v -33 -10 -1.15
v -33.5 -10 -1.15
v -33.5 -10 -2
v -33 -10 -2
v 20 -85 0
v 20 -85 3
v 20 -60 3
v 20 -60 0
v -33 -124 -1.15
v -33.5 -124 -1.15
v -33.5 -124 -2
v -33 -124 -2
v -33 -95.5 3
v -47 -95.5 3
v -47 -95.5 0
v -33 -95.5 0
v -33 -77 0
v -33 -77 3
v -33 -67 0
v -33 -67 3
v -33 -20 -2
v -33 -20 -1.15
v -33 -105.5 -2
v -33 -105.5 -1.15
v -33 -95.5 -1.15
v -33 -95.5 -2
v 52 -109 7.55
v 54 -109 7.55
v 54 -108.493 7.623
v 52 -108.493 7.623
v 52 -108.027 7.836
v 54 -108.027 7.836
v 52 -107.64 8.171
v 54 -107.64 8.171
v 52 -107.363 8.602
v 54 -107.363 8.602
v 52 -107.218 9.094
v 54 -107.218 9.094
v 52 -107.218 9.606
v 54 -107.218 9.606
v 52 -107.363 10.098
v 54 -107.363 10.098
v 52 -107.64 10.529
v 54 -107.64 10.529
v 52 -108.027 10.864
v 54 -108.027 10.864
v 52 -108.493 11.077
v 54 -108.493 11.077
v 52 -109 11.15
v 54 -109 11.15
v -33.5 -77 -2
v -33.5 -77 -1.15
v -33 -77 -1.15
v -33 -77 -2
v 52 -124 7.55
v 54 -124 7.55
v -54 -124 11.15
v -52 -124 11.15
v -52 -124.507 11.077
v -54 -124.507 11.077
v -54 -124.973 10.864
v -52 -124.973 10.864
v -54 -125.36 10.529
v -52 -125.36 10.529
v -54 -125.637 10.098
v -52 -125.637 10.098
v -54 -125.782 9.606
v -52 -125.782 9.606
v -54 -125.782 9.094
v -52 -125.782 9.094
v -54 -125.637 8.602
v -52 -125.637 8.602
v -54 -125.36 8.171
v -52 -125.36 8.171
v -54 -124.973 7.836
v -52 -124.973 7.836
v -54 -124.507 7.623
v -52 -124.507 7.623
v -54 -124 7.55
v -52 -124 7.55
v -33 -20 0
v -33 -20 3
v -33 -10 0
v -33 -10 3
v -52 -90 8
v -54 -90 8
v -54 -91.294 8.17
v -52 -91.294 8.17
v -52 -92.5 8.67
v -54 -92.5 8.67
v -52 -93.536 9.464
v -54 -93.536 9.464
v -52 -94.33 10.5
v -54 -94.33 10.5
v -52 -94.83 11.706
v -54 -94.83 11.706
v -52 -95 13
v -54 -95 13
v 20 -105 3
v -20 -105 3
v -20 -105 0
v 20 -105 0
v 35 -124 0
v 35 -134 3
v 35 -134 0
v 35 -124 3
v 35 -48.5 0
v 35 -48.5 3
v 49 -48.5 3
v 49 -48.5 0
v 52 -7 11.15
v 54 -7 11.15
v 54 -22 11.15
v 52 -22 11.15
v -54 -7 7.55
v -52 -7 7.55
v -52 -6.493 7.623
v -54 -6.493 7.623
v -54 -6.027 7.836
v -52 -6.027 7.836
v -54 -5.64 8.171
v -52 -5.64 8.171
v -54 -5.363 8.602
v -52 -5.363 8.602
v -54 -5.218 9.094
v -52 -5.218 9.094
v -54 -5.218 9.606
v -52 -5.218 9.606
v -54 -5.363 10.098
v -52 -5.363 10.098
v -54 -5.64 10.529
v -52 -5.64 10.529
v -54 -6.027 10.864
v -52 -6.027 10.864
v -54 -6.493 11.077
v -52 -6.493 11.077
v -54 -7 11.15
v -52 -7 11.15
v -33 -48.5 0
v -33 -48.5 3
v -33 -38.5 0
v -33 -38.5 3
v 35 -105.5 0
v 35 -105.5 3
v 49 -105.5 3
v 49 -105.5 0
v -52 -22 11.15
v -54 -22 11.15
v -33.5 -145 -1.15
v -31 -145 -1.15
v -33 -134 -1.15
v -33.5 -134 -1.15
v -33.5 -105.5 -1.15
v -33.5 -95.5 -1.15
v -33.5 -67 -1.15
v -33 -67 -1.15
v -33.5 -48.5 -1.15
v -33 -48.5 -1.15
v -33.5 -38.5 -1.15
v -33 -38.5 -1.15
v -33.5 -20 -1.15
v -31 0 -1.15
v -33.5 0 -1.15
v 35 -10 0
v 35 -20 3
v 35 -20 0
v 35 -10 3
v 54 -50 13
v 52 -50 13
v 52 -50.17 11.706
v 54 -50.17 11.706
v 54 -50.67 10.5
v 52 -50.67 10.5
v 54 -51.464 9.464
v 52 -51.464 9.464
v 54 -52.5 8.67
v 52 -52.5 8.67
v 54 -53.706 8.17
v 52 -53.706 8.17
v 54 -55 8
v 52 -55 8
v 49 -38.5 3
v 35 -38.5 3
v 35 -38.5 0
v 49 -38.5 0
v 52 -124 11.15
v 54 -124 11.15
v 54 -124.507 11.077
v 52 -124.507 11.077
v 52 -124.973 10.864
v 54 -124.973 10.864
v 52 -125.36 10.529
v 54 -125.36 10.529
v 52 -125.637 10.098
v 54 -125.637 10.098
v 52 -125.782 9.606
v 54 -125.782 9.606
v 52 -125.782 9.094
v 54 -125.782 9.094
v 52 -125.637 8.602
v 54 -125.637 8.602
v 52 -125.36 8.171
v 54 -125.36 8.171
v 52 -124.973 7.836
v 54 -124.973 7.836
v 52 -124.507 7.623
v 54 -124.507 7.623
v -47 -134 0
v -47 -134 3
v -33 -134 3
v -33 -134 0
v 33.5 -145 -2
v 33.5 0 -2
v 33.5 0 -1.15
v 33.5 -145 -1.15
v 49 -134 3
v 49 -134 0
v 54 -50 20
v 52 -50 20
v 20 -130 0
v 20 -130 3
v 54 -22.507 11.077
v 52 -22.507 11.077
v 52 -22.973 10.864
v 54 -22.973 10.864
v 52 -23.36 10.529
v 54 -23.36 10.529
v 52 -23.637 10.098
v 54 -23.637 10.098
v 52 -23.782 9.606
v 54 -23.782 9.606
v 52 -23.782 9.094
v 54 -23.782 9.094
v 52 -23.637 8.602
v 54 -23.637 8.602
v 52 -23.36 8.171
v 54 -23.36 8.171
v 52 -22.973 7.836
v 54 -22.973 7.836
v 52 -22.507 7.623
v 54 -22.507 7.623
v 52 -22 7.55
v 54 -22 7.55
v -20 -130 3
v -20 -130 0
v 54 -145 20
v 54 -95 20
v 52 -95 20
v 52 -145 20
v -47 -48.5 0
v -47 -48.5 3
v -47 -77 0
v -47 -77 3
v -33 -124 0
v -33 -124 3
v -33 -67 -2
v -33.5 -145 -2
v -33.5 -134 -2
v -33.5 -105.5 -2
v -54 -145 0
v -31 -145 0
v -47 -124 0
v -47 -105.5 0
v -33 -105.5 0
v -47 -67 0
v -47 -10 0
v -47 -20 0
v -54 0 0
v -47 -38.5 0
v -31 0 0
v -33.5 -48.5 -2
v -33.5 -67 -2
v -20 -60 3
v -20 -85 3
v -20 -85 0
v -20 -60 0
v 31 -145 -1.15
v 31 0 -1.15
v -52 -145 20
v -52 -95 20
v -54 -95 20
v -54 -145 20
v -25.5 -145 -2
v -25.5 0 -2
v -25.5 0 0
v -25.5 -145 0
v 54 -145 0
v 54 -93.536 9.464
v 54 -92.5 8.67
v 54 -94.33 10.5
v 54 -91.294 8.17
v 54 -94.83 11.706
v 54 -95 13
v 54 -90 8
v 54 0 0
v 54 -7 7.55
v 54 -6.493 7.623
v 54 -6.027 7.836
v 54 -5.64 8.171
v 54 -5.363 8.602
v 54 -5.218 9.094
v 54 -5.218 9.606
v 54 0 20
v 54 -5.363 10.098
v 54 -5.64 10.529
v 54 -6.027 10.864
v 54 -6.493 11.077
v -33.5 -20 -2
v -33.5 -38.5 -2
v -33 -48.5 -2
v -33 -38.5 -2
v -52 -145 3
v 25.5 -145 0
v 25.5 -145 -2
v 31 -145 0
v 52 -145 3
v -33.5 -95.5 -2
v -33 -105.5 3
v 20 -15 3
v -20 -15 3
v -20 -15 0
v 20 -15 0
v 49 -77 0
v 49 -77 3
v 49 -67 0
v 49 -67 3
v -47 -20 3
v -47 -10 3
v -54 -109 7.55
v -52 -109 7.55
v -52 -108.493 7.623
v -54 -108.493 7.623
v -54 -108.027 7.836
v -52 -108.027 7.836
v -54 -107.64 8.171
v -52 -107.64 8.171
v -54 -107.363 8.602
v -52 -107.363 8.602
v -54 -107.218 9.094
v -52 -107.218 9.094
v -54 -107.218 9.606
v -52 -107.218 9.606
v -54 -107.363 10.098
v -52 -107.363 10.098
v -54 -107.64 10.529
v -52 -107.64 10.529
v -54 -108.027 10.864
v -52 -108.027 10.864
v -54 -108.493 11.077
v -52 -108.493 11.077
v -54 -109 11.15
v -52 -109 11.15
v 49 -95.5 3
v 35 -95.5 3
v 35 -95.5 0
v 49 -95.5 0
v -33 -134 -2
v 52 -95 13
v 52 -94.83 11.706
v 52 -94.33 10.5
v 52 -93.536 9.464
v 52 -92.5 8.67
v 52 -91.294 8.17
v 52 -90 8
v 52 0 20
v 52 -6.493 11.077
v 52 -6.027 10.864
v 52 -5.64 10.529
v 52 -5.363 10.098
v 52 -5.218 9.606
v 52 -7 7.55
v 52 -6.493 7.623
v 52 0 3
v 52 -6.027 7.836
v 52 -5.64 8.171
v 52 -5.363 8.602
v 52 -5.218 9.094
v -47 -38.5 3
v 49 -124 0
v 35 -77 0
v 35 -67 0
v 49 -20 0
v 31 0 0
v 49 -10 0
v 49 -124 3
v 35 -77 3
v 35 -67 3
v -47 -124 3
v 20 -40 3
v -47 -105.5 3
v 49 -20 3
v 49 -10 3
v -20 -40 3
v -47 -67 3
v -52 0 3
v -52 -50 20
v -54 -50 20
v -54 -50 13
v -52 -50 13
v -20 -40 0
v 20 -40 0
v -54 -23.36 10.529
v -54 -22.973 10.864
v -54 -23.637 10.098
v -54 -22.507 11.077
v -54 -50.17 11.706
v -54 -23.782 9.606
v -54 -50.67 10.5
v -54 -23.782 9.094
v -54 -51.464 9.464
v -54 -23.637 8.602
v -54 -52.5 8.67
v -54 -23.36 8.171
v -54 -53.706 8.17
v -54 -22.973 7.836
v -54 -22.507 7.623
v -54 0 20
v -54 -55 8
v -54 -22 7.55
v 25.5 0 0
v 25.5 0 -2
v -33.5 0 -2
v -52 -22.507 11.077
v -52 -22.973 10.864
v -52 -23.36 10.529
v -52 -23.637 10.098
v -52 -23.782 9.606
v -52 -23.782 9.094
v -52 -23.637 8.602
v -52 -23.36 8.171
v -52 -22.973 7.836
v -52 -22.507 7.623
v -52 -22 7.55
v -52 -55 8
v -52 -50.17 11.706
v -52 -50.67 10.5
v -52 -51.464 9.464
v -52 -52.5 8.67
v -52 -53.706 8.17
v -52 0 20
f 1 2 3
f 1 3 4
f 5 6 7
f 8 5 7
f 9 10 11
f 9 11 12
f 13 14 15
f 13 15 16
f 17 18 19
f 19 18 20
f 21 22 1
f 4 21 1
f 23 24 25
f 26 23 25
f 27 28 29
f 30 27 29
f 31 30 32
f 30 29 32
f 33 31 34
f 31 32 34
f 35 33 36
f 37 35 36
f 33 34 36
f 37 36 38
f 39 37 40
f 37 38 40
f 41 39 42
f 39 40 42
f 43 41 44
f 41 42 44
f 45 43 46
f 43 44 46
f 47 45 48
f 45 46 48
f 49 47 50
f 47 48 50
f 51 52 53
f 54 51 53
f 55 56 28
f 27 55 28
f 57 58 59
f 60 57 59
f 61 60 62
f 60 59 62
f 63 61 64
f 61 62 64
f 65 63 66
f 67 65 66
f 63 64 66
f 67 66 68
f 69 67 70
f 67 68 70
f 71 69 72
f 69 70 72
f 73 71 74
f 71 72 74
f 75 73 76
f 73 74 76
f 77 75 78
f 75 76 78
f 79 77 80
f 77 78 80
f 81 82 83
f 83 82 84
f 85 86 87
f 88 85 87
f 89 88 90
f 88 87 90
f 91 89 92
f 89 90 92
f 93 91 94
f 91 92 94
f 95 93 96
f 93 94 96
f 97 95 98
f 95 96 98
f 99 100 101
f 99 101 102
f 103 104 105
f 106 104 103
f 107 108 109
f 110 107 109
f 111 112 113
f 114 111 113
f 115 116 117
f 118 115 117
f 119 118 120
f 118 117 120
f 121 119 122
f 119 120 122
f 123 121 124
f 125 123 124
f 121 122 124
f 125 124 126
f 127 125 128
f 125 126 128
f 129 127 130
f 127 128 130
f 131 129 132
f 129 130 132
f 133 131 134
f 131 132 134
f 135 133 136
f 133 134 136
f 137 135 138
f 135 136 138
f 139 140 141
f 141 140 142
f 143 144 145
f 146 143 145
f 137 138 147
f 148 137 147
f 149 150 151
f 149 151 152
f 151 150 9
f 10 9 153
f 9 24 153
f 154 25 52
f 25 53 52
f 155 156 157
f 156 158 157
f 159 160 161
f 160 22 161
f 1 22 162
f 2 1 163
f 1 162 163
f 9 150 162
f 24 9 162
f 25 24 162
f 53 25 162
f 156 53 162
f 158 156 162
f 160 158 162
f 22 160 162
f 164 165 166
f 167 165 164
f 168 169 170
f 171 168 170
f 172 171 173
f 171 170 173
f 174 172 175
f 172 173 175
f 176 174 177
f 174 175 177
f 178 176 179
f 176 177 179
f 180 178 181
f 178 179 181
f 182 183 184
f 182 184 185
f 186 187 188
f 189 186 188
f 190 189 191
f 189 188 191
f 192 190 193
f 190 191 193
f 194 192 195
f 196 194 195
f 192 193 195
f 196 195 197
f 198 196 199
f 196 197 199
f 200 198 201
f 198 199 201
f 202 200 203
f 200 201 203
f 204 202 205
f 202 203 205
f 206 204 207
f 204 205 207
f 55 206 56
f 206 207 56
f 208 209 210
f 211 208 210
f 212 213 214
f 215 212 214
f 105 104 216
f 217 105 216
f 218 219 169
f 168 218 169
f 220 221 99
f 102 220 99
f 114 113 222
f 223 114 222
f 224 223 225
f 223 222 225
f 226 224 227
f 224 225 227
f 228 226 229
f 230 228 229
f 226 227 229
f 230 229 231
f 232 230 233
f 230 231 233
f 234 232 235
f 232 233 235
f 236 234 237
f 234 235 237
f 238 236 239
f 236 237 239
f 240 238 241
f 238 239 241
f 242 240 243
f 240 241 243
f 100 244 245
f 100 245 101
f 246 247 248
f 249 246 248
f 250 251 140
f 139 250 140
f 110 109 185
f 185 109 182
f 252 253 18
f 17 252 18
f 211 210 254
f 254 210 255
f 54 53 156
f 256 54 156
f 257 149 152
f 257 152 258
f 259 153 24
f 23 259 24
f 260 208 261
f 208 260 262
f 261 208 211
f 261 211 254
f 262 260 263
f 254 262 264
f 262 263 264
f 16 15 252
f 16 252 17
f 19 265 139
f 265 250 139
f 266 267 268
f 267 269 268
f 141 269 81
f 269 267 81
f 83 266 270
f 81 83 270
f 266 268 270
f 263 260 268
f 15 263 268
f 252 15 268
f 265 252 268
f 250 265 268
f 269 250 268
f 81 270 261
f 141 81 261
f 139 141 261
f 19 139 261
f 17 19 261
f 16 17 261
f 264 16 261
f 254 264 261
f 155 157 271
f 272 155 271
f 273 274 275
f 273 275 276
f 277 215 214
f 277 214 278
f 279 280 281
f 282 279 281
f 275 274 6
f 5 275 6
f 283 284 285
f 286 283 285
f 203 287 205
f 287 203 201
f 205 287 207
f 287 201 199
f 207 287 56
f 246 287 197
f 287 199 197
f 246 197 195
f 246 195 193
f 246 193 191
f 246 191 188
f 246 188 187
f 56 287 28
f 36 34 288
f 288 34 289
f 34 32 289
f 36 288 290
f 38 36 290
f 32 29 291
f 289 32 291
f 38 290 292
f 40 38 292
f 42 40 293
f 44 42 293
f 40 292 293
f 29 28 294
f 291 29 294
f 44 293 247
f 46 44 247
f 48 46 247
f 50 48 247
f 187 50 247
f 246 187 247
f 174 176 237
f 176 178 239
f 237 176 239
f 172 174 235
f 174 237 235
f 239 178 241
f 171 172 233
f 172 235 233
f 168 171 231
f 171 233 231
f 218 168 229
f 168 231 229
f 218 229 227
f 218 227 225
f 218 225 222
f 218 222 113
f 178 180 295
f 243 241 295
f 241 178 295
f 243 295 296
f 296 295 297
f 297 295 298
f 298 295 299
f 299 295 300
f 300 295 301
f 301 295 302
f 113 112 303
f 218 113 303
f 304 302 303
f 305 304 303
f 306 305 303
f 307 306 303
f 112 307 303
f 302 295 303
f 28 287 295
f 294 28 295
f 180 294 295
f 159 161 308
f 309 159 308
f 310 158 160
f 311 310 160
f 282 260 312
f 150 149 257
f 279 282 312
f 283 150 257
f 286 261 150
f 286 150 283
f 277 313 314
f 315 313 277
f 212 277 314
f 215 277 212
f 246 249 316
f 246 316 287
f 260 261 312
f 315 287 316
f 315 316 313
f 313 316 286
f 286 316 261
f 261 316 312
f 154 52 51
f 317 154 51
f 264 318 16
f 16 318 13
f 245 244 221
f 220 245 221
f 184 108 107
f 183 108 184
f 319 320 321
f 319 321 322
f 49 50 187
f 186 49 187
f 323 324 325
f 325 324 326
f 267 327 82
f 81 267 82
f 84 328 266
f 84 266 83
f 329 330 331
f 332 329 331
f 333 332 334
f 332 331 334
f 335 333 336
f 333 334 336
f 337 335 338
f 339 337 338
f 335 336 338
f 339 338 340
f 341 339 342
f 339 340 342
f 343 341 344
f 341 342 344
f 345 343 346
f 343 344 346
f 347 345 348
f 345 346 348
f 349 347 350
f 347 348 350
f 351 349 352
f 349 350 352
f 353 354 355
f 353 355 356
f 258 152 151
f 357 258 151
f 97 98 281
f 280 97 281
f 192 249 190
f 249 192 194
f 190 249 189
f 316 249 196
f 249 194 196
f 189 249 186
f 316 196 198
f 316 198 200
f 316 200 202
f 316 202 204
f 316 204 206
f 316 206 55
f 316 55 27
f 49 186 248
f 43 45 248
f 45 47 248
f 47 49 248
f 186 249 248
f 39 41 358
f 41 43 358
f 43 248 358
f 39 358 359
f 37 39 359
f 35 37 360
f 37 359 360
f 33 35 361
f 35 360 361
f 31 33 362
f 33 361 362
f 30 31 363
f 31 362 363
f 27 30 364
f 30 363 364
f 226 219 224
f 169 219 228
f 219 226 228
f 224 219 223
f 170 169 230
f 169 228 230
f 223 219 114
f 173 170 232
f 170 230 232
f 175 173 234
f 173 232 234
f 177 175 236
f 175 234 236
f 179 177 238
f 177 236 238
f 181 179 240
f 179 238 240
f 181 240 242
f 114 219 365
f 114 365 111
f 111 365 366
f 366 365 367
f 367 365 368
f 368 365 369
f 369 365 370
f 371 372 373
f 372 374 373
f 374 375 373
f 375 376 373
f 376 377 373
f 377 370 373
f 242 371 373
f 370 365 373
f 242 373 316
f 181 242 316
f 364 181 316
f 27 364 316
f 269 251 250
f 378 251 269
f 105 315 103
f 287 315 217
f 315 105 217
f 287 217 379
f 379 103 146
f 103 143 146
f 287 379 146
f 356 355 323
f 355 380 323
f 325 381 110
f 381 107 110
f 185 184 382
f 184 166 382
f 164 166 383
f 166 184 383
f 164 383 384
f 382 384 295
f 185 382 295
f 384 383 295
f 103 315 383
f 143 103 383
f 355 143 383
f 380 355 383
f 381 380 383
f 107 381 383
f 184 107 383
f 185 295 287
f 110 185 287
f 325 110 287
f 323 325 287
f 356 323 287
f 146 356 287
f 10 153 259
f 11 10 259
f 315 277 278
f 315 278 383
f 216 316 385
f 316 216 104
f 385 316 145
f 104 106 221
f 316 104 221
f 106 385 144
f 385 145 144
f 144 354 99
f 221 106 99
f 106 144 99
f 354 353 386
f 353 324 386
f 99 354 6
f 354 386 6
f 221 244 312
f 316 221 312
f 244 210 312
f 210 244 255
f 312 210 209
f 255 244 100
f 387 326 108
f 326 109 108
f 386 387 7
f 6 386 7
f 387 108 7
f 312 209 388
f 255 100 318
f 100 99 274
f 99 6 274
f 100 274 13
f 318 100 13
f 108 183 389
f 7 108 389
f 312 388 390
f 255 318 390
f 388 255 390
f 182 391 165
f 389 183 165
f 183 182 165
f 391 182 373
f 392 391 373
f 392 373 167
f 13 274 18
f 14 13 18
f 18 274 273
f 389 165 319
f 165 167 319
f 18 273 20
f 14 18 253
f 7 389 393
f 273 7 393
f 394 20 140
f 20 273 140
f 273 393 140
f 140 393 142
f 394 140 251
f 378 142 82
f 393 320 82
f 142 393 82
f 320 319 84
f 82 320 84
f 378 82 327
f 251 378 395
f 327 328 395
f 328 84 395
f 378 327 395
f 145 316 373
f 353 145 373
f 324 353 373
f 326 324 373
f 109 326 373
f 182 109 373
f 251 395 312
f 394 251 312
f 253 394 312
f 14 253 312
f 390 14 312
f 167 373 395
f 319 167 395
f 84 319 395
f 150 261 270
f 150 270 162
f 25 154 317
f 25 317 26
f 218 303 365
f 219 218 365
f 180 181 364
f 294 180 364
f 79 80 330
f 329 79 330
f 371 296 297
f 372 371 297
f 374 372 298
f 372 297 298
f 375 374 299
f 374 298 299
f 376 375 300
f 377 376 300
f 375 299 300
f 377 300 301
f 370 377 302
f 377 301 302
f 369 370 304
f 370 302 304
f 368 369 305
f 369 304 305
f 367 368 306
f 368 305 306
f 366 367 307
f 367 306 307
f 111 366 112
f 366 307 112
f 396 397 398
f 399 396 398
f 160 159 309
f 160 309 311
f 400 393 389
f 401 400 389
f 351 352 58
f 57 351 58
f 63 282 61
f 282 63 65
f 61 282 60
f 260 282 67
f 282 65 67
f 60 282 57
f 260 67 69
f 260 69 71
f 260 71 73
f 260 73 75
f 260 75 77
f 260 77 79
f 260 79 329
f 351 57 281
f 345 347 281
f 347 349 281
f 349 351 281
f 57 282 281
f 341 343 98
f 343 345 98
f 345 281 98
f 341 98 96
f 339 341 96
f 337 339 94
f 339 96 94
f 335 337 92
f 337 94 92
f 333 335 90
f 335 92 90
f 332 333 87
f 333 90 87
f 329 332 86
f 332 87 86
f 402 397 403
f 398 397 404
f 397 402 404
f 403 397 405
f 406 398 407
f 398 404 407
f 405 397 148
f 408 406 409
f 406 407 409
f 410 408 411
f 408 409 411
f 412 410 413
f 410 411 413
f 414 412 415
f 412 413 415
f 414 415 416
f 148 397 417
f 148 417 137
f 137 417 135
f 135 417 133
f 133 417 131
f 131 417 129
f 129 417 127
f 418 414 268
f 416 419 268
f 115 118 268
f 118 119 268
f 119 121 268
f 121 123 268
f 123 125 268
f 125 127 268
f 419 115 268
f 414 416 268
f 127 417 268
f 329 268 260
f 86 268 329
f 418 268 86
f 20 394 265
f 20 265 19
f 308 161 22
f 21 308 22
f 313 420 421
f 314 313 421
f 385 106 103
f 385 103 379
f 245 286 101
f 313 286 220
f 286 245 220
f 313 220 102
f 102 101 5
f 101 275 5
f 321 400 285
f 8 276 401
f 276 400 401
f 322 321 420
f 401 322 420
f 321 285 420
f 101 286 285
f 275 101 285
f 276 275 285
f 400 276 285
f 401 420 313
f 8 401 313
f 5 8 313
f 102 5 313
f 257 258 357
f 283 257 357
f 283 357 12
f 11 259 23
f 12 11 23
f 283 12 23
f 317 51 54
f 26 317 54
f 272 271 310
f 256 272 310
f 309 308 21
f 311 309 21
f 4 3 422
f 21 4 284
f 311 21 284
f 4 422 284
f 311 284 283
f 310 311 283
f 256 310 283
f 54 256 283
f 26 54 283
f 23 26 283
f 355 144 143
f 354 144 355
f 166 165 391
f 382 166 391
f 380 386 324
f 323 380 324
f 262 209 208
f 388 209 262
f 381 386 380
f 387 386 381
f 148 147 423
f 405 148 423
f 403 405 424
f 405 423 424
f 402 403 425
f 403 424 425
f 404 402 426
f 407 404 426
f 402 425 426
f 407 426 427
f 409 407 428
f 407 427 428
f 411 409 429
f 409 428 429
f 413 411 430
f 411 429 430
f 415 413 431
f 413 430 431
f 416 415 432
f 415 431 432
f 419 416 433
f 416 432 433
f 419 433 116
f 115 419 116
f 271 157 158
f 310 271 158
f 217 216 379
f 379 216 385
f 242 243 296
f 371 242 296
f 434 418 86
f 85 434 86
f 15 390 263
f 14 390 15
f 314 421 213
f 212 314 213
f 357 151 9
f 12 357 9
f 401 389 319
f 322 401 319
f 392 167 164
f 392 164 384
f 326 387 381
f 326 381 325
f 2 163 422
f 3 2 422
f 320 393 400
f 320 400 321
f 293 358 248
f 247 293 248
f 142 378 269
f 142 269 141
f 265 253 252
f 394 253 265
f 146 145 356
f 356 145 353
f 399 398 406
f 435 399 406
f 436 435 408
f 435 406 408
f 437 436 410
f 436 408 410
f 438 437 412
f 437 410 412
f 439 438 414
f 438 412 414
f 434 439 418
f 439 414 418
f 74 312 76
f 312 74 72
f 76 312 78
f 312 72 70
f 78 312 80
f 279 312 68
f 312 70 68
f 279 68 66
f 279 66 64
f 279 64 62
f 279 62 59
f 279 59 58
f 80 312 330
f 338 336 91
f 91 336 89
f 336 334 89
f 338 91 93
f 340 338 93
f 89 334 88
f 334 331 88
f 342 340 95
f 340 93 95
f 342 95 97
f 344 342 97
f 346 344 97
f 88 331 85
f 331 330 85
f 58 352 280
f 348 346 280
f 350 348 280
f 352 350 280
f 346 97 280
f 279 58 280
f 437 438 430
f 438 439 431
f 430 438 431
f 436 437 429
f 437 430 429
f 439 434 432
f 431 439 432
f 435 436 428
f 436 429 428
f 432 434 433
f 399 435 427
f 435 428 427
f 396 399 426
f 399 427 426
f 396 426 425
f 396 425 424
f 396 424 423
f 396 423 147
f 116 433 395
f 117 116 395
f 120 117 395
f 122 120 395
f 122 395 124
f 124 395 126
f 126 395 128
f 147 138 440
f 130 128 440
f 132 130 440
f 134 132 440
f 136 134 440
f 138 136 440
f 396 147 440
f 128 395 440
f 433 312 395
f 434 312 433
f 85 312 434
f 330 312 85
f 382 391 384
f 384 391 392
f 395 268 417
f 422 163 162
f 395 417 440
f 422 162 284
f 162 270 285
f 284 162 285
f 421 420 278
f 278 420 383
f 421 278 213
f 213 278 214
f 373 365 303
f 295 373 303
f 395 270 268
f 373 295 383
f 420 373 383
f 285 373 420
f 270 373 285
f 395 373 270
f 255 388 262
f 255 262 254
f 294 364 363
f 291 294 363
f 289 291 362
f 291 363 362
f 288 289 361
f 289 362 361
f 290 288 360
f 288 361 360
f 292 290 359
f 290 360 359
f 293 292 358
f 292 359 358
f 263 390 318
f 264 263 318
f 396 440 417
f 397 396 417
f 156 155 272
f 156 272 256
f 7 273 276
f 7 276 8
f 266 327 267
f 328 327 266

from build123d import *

# Parameters (mm, degrees)
F1_DEPTH = 145
F3_DEPTH = 108.001
F4_W     = 40
F4_H     = 25
F4_W_2   = 14
F4_H_2   = 10
F5_DEPTH = 5.001
F7_DEPTH = 108.001


with BuildPart() as f1:
    # F0 (on Front) → F1 (new body)
    with BuildSketch(Plane.XZ):
        Polygon((-54, 20), (-54, 0), (-31, 0), (-31, -1.15), (-33.5, -1.15), (-33.5, -2), (-25.5, -2), (-25.5, 0), (25.5, 0), (25.5, -2), (33.5, -2), (33.5, -1.15), (31, -1.15), (31, 0), (54, 0), (54, 20), (52, 20), (52, 3), (0, 3), (-52, 3), (-52, 20), align=None)
    extrude(amount=F1_DEPTH)

    # F2 (on face) → F3 (cut, through all)
    with BuildSketch(Plane.YZ.offset(54)):
        with BuildLine():
            Line((-109, 11.15), (-124, 11.15))
            ThreePointArc((-124, 11.15), (-125.8, 9.35), (-124, 7.55))
            Line((-124, 7.55), (-109, 7.55))
            ThreePointArc((-109, 7.55), (-107.2, 9.35), (-109, 11.15))
        make_face()
        with BuildLine():
            ThreePointArc((-22, 11.15), (-23.8, 9.35), (-22, 7.55))
            Line((-22, 7.55), (-7, 7.55))
            ThreePointArc((-7, 7.55), (-5.2, 9.35), (-7, 11.15))
            Line((-7, 11.15), (-22, 11.15))
        make_face()
    extrude(amount=-F3_DEPTH, mode=Mode.SUBTRACT)

    # F4 (on face) → F5 (cut, through all)
    with BuildSketch(Plane.XY.offset(3)):
        with Locations((0, -27.5)):
            Rectangle(F4_W, F4_H)
        with Locations((-40, -15)):
            Rectangle(F4_W_2, F4_H_2)
        with Locations((-40, -43.5)):
            Rectangle(F4_W_2, F4_H_2)
        with Locations((-40, -72)):
            Rectangle(F4_W_2, F4_H_2)
        with Locations((-40, -100.5)):
            Rectangle(F4_W_2, F4_H_2)
        with Locations((-40, -129)):
            Rectangle(F4_W_2, F4_H_2)
        with Locations((42, -15)):
            Rectangle(F4_W_2, F4_H_2)
        with Locations((42, -43.5)):
            Rectangle(F4_W_2, F4_H_2)
        with Locations((42, -72)):
            Rectangle(F4_W_2, F4_H_2)
        with Locations((42, -100.5)):
            Rectangle(F4_W_2, F4_H_2)
        with Locations((42, -129)):
            Rectangle(F4_W_2, F4_H_2)
        with Locations((0, -72.5)):
            Rectangle(F4_W, F4_H)
        with Locations((0, -117.5)):
            Rectangle(F4_W, F4_H)
    extrude(amount=-F5_DEPTH, mode=Mode.SUBTRACT)

    # F6 (on face) → F7 (cut, through all)
    with BuildSketch(Plane(origin=(-54, 0, 0), x_dir=(0, -1, 0), z_dir=(-1, 0, 0))):
        with BuildLine():
            Line((95, 20), (50, 20))
            Line((50, 20), (50, 13))
            ThreePointArc((50, 13), (51.464466, 9.464466), (55, 8))
            Line((55, 8), (90, 8))
            ThreePointArc((90, 8), (93.535534, 9.464466), (95, 13))
            Line((95, 13), (95, 20))
        make_face()
    extrude(amount=-F7_DEPTH, mode=Mode.SUBTRACT)


solid = f1.part
